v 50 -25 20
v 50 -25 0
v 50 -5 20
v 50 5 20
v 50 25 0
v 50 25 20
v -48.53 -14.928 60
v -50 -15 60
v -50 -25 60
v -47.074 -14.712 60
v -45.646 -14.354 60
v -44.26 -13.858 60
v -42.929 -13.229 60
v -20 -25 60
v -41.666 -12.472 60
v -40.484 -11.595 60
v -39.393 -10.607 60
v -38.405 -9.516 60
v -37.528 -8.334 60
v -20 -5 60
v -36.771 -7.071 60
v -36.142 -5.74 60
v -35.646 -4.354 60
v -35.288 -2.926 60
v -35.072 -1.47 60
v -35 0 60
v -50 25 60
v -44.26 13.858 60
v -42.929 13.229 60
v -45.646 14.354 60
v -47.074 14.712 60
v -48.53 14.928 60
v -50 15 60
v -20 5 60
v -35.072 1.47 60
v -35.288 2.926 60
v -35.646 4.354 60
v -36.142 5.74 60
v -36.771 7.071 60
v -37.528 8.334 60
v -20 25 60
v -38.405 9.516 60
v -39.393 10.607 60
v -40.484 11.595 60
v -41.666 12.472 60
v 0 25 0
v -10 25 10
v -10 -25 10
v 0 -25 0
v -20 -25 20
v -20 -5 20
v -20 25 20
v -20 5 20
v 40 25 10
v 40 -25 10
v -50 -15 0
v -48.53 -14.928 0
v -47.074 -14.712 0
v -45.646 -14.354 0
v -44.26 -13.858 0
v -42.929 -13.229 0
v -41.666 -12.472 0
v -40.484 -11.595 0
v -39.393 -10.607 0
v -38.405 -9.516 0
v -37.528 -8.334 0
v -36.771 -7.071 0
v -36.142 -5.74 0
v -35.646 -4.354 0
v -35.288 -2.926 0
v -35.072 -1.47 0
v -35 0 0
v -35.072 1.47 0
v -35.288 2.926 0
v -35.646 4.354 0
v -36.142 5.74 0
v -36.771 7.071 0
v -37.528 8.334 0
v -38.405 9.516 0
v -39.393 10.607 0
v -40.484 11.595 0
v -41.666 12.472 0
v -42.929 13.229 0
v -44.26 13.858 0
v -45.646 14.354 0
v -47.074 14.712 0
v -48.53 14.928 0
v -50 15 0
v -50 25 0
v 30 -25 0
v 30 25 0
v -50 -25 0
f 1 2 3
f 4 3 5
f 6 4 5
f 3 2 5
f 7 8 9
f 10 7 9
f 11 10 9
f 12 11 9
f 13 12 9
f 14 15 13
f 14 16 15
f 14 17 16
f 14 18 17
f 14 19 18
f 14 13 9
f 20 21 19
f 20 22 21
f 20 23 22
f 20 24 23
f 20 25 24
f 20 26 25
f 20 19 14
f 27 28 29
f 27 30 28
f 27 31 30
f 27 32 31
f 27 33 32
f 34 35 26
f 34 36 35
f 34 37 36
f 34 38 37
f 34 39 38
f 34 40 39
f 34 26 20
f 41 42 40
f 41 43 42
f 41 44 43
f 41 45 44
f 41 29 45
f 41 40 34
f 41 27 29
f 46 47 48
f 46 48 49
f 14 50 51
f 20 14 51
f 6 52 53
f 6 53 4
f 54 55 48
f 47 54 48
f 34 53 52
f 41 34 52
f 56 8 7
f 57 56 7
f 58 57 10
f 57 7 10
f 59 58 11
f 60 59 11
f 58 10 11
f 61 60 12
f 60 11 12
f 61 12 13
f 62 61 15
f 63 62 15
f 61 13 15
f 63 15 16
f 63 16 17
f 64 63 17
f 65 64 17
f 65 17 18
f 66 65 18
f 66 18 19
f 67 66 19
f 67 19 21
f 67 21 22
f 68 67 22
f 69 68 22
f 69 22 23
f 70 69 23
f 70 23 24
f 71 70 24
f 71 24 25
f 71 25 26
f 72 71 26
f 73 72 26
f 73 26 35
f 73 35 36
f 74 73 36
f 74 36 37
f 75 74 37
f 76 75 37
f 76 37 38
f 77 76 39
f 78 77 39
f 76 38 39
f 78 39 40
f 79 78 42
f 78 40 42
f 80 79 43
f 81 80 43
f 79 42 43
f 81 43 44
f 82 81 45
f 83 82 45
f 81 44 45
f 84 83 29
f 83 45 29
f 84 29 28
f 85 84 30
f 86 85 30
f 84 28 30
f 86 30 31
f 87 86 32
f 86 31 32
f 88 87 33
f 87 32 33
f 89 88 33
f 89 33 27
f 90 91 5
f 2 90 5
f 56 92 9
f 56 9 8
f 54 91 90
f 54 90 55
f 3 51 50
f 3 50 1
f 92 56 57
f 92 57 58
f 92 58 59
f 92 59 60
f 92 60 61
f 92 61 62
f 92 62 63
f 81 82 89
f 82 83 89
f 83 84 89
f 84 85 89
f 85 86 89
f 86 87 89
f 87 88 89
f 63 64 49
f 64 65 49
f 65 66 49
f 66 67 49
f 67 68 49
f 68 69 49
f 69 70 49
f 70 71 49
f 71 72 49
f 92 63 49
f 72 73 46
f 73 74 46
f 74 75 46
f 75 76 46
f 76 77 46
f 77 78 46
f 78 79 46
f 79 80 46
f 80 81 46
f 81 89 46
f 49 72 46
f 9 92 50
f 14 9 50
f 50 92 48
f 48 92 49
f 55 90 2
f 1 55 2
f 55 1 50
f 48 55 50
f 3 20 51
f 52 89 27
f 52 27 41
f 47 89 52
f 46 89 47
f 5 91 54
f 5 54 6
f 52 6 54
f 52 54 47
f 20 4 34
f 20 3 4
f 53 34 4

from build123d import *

# Parameters (mm, degrees)
F0_W          = 30
F0_H          = 50
F1_DEPTH      = 60
F0_W_2        = 70
F2_DEPTH      = 20
F4_DEPTH      = 71.1
F6_DEPTH      = 5
F6_DEPTH_BACK = 5
F8_DEPTH      = 205.9


with BuildPart() as f1:
    # F0 (on Top) → F1 (new body)
    with BuildSketch(Plane.XY):
        with Locations((-35, 0)):
            Rectangle(F0_W, F0_H)
    extrude(amount=F1_DEPTH)

    # F0 (on Top) → F2 (join)
    with BuildSketch(Plane.XY):
        with Locations((15, 0)):
            Rectangle(F0_W_2, F0_H)
    extrude(amount=F2_DEPTH)

    # F3 (on face) → F4 (cut)
    with BuildSketch(Plane.XY.offset(60)):
        with BuildLine():
            ThreePointArc((-50, -15), (-39.3933982822, -10.6066017178), (-35, 0))
            ThreePointArc((-35, 0), (-39.3933982822, 10.6066017178), (-50, 15))
            Line((-50, 15), (-50, -15))
        make_face()
    extrude(amount=-F4_DEPTH, mode=Mode.SUBTRACT)

    # F5 (on Front) → F6 (join, two sides)
    with BuildSketch(Plane.XZ) as f6_sk:
        Polygon((-20, 20), (50, 20), (-20, 60), align=None)
    extrude(amount=F6_DEPTH)
    extrude(f6_sk.sketch, amount=-F6_DEPTH_BACK)

    # F7 (on face) → F8 (cut)
    with BuildSketch(Plane.XZ.offset(25)):
        Polygon((0, 0), (30, 0), (40, 10), (-10, 10), align=None)
    extrude(amount=-F8_DEPTH, mode=Mode.SUBTRACT)


solid = f1.part
